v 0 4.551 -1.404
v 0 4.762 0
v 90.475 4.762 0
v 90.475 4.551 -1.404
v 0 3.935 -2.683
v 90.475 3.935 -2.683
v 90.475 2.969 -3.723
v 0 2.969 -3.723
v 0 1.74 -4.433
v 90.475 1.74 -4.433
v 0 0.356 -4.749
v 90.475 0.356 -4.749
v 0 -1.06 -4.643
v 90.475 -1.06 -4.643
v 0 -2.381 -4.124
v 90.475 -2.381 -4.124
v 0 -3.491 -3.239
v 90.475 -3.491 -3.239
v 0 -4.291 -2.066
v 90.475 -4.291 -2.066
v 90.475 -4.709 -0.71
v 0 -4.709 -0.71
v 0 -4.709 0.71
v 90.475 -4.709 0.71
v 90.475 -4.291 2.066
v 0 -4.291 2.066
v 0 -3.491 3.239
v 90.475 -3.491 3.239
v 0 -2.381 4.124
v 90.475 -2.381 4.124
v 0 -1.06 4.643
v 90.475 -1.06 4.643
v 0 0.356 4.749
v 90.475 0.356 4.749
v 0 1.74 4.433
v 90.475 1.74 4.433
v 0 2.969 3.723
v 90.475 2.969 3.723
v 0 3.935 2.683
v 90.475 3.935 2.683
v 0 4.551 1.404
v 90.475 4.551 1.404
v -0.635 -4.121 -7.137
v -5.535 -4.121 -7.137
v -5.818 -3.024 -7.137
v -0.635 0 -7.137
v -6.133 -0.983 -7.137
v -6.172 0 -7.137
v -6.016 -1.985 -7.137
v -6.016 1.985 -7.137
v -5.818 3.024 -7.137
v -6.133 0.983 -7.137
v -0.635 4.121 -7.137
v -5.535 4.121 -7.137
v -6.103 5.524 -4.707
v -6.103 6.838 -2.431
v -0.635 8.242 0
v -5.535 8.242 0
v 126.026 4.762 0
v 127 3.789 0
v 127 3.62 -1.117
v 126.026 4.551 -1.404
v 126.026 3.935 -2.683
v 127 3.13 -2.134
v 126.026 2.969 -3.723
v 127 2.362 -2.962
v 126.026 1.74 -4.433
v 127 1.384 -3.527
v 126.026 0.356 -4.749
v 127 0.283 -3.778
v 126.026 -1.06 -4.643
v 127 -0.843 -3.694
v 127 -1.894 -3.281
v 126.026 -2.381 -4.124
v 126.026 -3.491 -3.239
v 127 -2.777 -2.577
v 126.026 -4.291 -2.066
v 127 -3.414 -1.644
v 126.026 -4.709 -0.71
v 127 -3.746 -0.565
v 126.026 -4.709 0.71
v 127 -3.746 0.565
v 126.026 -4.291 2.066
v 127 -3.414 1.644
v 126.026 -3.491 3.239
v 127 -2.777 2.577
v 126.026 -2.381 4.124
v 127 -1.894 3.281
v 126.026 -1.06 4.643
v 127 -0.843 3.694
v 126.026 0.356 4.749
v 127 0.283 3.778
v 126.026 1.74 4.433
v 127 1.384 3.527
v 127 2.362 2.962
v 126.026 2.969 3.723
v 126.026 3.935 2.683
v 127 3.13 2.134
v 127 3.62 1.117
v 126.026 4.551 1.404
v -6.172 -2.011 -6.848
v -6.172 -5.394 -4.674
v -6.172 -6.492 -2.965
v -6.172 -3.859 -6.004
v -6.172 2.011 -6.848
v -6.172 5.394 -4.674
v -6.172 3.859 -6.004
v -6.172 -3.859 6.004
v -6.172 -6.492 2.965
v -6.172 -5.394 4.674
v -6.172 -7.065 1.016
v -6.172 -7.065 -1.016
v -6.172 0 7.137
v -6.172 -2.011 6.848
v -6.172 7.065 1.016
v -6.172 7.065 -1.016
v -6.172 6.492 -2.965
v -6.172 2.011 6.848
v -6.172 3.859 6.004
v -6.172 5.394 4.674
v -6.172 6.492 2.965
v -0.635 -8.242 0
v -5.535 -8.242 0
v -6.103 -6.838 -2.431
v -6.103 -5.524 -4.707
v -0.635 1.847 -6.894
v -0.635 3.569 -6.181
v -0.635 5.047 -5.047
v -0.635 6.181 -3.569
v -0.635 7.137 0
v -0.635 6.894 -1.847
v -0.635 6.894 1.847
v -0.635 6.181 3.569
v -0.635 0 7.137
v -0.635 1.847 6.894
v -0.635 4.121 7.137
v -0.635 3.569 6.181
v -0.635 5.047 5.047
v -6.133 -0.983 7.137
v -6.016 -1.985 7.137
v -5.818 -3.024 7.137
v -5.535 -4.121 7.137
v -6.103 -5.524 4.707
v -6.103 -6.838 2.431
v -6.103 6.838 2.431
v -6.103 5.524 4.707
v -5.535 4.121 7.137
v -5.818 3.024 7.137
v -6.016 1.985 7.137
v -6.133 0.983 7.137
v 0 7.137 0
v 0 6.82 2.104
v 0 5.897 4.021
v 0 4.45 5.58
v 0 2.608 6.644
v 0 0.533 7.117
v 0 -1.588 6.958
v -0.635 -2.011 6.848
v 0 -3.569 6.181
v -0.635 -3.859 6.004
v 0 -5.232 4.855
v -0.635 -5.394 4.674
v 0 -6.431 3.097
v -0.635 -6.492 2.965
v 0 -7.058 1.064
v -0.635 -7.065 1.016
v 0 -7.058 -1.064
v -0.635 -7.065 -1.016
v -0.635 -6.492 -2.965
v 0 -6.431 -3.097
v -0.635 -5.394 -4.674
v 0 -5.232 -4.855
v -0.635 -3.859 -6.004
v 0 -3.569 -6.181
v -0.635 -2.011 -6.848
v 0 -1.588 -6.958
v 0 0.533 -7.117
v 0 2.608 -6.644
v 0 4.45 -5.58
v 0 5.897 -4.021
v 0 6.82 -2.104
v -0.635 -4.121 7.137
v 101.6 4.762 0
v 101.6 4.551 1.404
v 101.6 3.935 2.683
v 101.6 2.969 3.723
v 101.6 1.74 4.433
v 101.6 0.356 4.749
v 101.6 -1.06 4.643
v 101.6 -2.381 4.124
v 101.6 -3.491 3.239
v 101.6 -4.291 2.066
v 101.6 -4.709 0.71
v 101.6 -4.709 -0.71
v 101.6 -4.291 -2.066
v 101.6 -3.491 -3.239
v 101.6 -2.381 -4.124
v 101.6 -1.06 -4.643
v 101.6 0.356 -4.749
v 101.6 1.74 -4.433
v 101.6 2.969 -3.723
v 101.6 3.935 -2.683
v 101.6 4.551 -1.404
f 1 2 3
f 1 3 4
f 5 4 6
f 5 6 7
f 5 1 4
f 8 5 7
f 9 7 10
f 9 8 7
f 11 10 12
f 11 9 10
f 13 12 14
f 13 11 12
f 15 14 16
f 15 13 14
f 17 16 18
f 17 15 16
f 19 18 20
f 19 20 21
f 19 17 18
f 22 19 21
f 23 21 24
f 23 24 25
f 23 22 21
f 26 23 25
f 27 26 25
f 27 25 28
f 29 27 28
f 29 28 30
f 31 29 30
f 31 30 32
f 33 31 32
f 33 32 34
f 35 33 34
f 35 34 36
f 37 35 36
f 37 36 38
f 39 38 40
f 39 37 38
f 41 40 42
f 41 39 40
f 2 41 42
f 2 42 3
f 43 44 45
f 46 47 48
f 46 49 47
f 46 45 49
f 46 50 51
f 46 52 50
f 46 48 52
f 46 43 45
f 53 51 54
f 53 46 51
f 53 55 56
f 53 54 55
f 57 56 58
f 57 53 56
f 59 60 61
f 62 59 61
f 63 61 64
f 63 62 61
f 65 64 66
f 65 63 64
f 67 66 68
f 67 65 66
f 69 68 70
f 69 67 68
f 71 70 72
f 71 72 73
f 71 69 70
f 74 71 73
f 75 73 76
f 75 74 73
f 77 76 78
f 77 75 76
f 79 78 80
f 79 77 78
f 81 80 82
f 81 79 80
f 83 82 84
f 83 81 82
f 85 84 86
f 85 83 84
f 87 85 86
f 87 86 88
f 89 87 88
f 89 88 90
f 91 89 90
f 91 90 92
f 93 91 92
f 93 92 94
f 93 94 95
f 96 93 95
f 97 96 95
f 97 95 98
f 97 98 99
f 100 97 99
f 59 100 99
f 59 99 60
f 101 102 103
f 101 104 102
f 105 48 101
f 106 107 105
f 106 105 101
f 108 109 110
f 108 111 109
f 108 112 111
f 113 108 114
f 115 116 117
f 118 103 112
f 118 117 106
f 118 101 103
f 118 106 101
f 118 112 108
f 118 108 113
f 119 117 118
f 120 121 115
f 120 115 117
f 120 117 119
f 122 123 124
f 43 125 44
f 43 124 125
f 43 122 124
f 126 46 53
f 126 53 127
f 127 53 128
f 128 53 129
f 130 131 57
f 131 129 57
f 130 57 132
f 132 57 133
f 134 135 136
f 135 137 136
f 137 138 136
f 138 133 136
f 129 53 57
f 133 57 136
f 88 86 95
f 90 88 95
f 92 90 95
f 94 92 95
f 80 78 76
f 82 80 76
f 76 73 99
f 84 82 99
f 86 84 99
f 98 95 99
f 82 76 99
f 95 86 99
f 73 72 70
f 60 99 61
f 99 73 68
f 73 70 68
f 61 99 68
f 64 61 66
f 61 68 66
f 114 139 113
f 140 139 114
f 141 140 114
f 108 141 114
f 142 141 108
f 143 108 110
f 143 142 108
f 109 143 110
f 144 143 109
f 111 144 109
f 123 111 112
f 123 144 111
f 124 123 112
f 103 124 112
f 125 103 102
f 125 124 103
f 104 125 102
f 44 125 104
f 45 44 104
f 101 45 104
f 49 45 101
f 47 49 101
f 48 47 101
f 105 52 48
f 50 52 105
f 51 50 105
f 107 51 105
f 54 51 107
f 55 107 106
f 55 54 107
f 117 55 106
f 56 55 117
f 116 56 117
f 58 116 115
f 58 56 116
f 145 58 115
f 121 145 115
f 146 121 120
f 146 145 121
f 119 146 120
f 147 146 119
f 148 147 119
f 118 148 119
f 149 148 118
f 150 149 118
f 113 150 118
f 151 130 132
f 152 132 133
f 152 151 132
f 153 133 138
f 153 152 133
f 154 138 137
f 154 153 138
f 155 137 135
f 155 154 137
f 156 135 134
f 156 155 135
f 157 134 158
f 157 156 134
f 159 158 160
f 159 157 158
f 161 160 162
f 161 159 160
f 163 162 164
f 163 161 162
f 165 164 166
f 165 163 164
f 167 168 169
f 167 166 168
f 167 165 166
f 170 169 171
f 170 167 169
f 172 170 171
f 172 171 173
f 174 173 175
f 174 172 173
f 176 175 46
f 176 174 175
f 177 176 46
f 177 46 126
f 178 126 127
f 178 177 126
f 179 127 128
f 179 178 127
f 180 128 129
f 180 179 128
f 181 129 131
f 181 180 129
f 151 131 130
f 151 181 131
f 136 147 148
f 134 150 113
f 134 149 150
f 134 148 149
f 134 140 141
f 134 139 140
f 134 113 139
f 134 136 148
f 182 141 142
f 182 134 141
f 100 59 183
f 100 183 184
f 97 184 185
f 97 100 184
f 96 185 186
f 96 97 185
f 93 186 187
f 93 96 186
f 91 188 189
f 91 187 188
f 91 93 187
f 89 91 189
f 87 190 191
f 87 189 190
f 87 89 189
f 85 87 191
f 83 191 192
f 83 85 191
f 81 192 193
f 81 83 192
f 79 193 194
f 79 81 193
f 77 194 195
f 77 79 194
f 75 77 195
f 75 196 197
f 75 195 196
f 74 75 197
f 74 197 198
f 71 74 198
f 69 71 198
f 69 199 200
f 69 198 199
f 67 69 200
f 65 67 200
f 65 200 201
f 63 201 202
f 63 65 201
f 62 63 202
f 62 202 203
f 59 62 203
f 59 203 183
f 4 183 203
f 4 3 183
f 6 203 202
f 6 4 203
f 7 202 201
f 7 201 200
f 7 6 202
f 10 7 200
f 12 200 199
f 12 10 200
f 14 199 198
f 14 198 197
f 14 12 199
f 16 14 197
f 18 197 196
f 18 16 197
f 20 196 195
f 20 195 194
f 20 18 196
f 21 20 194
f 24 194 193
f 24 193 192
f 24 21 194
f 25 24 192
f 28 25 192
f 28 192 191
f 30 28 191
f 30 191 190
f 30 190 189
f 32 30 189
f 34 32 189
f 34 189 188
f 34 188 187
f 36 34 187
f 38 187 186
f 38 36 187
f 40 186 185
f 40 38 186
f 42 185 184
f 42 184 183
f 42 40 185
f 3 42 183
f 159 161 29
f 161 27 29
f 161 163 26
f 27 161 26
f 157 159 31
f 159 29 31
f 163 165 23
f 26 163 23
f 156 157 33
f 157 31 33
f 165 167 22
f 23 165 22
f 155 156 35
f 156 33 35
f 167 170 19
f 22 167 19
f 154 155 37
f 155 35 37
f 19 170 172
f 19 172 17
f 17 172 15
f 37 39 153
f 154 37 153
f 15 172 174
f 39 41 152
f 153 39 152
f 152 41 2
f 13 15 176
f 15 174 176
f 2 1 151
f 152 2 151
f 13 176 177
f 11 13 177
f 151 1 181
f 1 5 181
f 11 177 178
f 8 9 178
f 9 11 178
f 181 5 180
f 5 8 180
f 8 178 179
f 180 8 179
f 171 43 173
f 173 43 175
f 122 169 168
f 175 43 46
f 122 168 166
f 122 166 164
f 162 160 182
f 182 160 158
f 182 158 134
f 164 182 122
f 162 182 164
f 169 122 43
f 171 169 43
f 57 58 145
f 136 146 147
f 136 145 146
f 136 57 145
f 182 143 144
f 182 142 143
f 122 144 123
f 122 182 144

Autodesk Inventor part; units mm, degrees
ref_plane "YZ Plane" through (0, 0, 0) normal (1, 0, 0) x (0, 1, 0)
ref_plane "XZ Plane" through (0, 0, 0) normal (0, 1, 0) x (-1, 0, 0)
sketch "Sketch1" plane through (0, 0, 0) normal (0, 0, 1) x (1, 0, 0)
  line L0 (0, 7.1374) -> (0, 4.7625)
  line L1 (101.6, 4.7625) -> (127, 4.7625)
  line L2 (127, 4.7625) -> (127, 0)
  line L3 (127, 0) -> (-0.6351, 0)
  line L4 (-26.1621, 0) -> (152.527, 0) projected
  line L5 (-0.6351, 0) -> (-0.6351, 7.1374)
  line L6 (-0.6351, 7.1374) -> (0, 7.1374)
  line L7 (101.6, 4.7625) -> (90.4747, 4.7625)
  line L8 (90.4747, 4.7625) -> (0, 4.7625)
  line L9 (0, -1.4275) -> (0, 8.5649) projected
  dimension "d0" = 127
  dimension "d1" = 25.4
  dimension "d2" = 9.525
  dimension "d9" = 0.6351
  dimension "d10" = 14.2748
  dimension "d13" = 11.1253
  dimension "d14" = 9.525
revolve "Body" add sketch "Sketch1" angle 360 about axis through (127, 0, 0) along (-1, 0, 0)
sketch "Sketch2" plane through (-0.6351, 0, 0) normal (-1, 0, 0) x (0, 0, 1)
  line L0 (0, 8.2416) -> (7.1374, 4.1208)
  line L1 (7.1374, 4.1208) -> (7.1374, -4.1208)
  line L2 (7.1374, -4.1208) -> (0, -8.2416)
  line L3 (0, -8.2416) -> (-7.1374, -4.1208)
  line L4 (-7.1374, -4.1208) -> (-7.1374, 4.1208)
  line L5 (-7.1374, 4.1208) -> (0, 8.2416)
  point P0 (0, 0)
  point P1 (0, 0)
  dimension "d11" = 14.2748
extrude "Head" add sketch "Sketch2" along normal blind 5.5372
sketch "Sketch4" plane through (0, 0, 0) normal (0, 0, 1) x (1, 0, 0)
  line L0 (-6.1723, 7.1374) -> (-6.1723, 8.2416)
  line L1 (-6.1723, 8.2416) -> (-5.5348, 8.2416)
  line L2 (-5.5348, 8.2416) -> (-6.1723, 7.1374)
  line L3 (-7.2797, 0) -> (0.4723, 0) projected
  line L4 (-0.6351, 8.2416) -> (-6.1723, 8.2416) projected
  line L5 (-6.1723, 4.1208) -> (-6.1723, 8.2416) projected
  dimension "d5" = 30
  dimension "d19" = 14.2748
revolve "Chamfer1" cut sketch "Sketch4" angle 360 about axis through (-10, 0, 0) along (1, 0, 0)
thread "Thread" size "3/8-16 UNC" class "2A" standard "ANSI Unified Screw Threads" length 25.4
chamfer "Chamfer2" distance 0.9738 distance2 0.9739 1 edges at (127, -4.7625, 0) measured on face at (127, -1.1883, 1.0527)
ref_plane "Work Plane1" through (1.525, 0, 0) normal (0, 0, 1) x (1, 0, 0)
equation "\"d0\" = NLG"
equation "\"d1\" = GEL"
equation "\"d2\" = GD"
equation "\"d10\" = SD2"
equation "\"d14\" = BDM"
equation "\"d11\" = SW"
equation "\"d3\" = KOH - SD"
equation "\"d5\" = ANG1"
equation "\"d19\" = SW0"
equation "\"d15\" = GEL"
equation "\"d6\" = -0.5 * SPD + 0.5 * GD"
equation "\"NLG\" = 127"
equation "\"GD\" = 9.525"
equation "\"BDM\" = 9.525"
equation "\"KOH\" = 6.1722"
equation "\"GEL\" = 25.4"
equation "\"SW\" = 14.2748"
equation "\"SW0\" = SW"
equation "\"SPD\" = GD1"
equation "\"SD2\" = SW"
equation "\"SD\" = 0.635"
equation "\"ANG1\" = 30deg"
equation "\"GAL\" = 11.1252"
equation "\"GUL\" = 0.97384"
equation "\"RR\" = 0.381"
equation "\"WFT\" = SD"
equation "\"GD1\" = 7.57733"
equation "\"THREADDIA\" = 9.525"
equation "\"SDH\" = SW"
equation "\"SDHG\" = 90.4748"
equation "\"TOA\" = 30deg"
equation "\"FAWI\" = 45deg"
equation "\"NND\" = 9.525"
equation "\"E0\" = 16.48739"
properties part number "AS 2465 - 3/8 x 5  UNC" material "Steel, Mild"
